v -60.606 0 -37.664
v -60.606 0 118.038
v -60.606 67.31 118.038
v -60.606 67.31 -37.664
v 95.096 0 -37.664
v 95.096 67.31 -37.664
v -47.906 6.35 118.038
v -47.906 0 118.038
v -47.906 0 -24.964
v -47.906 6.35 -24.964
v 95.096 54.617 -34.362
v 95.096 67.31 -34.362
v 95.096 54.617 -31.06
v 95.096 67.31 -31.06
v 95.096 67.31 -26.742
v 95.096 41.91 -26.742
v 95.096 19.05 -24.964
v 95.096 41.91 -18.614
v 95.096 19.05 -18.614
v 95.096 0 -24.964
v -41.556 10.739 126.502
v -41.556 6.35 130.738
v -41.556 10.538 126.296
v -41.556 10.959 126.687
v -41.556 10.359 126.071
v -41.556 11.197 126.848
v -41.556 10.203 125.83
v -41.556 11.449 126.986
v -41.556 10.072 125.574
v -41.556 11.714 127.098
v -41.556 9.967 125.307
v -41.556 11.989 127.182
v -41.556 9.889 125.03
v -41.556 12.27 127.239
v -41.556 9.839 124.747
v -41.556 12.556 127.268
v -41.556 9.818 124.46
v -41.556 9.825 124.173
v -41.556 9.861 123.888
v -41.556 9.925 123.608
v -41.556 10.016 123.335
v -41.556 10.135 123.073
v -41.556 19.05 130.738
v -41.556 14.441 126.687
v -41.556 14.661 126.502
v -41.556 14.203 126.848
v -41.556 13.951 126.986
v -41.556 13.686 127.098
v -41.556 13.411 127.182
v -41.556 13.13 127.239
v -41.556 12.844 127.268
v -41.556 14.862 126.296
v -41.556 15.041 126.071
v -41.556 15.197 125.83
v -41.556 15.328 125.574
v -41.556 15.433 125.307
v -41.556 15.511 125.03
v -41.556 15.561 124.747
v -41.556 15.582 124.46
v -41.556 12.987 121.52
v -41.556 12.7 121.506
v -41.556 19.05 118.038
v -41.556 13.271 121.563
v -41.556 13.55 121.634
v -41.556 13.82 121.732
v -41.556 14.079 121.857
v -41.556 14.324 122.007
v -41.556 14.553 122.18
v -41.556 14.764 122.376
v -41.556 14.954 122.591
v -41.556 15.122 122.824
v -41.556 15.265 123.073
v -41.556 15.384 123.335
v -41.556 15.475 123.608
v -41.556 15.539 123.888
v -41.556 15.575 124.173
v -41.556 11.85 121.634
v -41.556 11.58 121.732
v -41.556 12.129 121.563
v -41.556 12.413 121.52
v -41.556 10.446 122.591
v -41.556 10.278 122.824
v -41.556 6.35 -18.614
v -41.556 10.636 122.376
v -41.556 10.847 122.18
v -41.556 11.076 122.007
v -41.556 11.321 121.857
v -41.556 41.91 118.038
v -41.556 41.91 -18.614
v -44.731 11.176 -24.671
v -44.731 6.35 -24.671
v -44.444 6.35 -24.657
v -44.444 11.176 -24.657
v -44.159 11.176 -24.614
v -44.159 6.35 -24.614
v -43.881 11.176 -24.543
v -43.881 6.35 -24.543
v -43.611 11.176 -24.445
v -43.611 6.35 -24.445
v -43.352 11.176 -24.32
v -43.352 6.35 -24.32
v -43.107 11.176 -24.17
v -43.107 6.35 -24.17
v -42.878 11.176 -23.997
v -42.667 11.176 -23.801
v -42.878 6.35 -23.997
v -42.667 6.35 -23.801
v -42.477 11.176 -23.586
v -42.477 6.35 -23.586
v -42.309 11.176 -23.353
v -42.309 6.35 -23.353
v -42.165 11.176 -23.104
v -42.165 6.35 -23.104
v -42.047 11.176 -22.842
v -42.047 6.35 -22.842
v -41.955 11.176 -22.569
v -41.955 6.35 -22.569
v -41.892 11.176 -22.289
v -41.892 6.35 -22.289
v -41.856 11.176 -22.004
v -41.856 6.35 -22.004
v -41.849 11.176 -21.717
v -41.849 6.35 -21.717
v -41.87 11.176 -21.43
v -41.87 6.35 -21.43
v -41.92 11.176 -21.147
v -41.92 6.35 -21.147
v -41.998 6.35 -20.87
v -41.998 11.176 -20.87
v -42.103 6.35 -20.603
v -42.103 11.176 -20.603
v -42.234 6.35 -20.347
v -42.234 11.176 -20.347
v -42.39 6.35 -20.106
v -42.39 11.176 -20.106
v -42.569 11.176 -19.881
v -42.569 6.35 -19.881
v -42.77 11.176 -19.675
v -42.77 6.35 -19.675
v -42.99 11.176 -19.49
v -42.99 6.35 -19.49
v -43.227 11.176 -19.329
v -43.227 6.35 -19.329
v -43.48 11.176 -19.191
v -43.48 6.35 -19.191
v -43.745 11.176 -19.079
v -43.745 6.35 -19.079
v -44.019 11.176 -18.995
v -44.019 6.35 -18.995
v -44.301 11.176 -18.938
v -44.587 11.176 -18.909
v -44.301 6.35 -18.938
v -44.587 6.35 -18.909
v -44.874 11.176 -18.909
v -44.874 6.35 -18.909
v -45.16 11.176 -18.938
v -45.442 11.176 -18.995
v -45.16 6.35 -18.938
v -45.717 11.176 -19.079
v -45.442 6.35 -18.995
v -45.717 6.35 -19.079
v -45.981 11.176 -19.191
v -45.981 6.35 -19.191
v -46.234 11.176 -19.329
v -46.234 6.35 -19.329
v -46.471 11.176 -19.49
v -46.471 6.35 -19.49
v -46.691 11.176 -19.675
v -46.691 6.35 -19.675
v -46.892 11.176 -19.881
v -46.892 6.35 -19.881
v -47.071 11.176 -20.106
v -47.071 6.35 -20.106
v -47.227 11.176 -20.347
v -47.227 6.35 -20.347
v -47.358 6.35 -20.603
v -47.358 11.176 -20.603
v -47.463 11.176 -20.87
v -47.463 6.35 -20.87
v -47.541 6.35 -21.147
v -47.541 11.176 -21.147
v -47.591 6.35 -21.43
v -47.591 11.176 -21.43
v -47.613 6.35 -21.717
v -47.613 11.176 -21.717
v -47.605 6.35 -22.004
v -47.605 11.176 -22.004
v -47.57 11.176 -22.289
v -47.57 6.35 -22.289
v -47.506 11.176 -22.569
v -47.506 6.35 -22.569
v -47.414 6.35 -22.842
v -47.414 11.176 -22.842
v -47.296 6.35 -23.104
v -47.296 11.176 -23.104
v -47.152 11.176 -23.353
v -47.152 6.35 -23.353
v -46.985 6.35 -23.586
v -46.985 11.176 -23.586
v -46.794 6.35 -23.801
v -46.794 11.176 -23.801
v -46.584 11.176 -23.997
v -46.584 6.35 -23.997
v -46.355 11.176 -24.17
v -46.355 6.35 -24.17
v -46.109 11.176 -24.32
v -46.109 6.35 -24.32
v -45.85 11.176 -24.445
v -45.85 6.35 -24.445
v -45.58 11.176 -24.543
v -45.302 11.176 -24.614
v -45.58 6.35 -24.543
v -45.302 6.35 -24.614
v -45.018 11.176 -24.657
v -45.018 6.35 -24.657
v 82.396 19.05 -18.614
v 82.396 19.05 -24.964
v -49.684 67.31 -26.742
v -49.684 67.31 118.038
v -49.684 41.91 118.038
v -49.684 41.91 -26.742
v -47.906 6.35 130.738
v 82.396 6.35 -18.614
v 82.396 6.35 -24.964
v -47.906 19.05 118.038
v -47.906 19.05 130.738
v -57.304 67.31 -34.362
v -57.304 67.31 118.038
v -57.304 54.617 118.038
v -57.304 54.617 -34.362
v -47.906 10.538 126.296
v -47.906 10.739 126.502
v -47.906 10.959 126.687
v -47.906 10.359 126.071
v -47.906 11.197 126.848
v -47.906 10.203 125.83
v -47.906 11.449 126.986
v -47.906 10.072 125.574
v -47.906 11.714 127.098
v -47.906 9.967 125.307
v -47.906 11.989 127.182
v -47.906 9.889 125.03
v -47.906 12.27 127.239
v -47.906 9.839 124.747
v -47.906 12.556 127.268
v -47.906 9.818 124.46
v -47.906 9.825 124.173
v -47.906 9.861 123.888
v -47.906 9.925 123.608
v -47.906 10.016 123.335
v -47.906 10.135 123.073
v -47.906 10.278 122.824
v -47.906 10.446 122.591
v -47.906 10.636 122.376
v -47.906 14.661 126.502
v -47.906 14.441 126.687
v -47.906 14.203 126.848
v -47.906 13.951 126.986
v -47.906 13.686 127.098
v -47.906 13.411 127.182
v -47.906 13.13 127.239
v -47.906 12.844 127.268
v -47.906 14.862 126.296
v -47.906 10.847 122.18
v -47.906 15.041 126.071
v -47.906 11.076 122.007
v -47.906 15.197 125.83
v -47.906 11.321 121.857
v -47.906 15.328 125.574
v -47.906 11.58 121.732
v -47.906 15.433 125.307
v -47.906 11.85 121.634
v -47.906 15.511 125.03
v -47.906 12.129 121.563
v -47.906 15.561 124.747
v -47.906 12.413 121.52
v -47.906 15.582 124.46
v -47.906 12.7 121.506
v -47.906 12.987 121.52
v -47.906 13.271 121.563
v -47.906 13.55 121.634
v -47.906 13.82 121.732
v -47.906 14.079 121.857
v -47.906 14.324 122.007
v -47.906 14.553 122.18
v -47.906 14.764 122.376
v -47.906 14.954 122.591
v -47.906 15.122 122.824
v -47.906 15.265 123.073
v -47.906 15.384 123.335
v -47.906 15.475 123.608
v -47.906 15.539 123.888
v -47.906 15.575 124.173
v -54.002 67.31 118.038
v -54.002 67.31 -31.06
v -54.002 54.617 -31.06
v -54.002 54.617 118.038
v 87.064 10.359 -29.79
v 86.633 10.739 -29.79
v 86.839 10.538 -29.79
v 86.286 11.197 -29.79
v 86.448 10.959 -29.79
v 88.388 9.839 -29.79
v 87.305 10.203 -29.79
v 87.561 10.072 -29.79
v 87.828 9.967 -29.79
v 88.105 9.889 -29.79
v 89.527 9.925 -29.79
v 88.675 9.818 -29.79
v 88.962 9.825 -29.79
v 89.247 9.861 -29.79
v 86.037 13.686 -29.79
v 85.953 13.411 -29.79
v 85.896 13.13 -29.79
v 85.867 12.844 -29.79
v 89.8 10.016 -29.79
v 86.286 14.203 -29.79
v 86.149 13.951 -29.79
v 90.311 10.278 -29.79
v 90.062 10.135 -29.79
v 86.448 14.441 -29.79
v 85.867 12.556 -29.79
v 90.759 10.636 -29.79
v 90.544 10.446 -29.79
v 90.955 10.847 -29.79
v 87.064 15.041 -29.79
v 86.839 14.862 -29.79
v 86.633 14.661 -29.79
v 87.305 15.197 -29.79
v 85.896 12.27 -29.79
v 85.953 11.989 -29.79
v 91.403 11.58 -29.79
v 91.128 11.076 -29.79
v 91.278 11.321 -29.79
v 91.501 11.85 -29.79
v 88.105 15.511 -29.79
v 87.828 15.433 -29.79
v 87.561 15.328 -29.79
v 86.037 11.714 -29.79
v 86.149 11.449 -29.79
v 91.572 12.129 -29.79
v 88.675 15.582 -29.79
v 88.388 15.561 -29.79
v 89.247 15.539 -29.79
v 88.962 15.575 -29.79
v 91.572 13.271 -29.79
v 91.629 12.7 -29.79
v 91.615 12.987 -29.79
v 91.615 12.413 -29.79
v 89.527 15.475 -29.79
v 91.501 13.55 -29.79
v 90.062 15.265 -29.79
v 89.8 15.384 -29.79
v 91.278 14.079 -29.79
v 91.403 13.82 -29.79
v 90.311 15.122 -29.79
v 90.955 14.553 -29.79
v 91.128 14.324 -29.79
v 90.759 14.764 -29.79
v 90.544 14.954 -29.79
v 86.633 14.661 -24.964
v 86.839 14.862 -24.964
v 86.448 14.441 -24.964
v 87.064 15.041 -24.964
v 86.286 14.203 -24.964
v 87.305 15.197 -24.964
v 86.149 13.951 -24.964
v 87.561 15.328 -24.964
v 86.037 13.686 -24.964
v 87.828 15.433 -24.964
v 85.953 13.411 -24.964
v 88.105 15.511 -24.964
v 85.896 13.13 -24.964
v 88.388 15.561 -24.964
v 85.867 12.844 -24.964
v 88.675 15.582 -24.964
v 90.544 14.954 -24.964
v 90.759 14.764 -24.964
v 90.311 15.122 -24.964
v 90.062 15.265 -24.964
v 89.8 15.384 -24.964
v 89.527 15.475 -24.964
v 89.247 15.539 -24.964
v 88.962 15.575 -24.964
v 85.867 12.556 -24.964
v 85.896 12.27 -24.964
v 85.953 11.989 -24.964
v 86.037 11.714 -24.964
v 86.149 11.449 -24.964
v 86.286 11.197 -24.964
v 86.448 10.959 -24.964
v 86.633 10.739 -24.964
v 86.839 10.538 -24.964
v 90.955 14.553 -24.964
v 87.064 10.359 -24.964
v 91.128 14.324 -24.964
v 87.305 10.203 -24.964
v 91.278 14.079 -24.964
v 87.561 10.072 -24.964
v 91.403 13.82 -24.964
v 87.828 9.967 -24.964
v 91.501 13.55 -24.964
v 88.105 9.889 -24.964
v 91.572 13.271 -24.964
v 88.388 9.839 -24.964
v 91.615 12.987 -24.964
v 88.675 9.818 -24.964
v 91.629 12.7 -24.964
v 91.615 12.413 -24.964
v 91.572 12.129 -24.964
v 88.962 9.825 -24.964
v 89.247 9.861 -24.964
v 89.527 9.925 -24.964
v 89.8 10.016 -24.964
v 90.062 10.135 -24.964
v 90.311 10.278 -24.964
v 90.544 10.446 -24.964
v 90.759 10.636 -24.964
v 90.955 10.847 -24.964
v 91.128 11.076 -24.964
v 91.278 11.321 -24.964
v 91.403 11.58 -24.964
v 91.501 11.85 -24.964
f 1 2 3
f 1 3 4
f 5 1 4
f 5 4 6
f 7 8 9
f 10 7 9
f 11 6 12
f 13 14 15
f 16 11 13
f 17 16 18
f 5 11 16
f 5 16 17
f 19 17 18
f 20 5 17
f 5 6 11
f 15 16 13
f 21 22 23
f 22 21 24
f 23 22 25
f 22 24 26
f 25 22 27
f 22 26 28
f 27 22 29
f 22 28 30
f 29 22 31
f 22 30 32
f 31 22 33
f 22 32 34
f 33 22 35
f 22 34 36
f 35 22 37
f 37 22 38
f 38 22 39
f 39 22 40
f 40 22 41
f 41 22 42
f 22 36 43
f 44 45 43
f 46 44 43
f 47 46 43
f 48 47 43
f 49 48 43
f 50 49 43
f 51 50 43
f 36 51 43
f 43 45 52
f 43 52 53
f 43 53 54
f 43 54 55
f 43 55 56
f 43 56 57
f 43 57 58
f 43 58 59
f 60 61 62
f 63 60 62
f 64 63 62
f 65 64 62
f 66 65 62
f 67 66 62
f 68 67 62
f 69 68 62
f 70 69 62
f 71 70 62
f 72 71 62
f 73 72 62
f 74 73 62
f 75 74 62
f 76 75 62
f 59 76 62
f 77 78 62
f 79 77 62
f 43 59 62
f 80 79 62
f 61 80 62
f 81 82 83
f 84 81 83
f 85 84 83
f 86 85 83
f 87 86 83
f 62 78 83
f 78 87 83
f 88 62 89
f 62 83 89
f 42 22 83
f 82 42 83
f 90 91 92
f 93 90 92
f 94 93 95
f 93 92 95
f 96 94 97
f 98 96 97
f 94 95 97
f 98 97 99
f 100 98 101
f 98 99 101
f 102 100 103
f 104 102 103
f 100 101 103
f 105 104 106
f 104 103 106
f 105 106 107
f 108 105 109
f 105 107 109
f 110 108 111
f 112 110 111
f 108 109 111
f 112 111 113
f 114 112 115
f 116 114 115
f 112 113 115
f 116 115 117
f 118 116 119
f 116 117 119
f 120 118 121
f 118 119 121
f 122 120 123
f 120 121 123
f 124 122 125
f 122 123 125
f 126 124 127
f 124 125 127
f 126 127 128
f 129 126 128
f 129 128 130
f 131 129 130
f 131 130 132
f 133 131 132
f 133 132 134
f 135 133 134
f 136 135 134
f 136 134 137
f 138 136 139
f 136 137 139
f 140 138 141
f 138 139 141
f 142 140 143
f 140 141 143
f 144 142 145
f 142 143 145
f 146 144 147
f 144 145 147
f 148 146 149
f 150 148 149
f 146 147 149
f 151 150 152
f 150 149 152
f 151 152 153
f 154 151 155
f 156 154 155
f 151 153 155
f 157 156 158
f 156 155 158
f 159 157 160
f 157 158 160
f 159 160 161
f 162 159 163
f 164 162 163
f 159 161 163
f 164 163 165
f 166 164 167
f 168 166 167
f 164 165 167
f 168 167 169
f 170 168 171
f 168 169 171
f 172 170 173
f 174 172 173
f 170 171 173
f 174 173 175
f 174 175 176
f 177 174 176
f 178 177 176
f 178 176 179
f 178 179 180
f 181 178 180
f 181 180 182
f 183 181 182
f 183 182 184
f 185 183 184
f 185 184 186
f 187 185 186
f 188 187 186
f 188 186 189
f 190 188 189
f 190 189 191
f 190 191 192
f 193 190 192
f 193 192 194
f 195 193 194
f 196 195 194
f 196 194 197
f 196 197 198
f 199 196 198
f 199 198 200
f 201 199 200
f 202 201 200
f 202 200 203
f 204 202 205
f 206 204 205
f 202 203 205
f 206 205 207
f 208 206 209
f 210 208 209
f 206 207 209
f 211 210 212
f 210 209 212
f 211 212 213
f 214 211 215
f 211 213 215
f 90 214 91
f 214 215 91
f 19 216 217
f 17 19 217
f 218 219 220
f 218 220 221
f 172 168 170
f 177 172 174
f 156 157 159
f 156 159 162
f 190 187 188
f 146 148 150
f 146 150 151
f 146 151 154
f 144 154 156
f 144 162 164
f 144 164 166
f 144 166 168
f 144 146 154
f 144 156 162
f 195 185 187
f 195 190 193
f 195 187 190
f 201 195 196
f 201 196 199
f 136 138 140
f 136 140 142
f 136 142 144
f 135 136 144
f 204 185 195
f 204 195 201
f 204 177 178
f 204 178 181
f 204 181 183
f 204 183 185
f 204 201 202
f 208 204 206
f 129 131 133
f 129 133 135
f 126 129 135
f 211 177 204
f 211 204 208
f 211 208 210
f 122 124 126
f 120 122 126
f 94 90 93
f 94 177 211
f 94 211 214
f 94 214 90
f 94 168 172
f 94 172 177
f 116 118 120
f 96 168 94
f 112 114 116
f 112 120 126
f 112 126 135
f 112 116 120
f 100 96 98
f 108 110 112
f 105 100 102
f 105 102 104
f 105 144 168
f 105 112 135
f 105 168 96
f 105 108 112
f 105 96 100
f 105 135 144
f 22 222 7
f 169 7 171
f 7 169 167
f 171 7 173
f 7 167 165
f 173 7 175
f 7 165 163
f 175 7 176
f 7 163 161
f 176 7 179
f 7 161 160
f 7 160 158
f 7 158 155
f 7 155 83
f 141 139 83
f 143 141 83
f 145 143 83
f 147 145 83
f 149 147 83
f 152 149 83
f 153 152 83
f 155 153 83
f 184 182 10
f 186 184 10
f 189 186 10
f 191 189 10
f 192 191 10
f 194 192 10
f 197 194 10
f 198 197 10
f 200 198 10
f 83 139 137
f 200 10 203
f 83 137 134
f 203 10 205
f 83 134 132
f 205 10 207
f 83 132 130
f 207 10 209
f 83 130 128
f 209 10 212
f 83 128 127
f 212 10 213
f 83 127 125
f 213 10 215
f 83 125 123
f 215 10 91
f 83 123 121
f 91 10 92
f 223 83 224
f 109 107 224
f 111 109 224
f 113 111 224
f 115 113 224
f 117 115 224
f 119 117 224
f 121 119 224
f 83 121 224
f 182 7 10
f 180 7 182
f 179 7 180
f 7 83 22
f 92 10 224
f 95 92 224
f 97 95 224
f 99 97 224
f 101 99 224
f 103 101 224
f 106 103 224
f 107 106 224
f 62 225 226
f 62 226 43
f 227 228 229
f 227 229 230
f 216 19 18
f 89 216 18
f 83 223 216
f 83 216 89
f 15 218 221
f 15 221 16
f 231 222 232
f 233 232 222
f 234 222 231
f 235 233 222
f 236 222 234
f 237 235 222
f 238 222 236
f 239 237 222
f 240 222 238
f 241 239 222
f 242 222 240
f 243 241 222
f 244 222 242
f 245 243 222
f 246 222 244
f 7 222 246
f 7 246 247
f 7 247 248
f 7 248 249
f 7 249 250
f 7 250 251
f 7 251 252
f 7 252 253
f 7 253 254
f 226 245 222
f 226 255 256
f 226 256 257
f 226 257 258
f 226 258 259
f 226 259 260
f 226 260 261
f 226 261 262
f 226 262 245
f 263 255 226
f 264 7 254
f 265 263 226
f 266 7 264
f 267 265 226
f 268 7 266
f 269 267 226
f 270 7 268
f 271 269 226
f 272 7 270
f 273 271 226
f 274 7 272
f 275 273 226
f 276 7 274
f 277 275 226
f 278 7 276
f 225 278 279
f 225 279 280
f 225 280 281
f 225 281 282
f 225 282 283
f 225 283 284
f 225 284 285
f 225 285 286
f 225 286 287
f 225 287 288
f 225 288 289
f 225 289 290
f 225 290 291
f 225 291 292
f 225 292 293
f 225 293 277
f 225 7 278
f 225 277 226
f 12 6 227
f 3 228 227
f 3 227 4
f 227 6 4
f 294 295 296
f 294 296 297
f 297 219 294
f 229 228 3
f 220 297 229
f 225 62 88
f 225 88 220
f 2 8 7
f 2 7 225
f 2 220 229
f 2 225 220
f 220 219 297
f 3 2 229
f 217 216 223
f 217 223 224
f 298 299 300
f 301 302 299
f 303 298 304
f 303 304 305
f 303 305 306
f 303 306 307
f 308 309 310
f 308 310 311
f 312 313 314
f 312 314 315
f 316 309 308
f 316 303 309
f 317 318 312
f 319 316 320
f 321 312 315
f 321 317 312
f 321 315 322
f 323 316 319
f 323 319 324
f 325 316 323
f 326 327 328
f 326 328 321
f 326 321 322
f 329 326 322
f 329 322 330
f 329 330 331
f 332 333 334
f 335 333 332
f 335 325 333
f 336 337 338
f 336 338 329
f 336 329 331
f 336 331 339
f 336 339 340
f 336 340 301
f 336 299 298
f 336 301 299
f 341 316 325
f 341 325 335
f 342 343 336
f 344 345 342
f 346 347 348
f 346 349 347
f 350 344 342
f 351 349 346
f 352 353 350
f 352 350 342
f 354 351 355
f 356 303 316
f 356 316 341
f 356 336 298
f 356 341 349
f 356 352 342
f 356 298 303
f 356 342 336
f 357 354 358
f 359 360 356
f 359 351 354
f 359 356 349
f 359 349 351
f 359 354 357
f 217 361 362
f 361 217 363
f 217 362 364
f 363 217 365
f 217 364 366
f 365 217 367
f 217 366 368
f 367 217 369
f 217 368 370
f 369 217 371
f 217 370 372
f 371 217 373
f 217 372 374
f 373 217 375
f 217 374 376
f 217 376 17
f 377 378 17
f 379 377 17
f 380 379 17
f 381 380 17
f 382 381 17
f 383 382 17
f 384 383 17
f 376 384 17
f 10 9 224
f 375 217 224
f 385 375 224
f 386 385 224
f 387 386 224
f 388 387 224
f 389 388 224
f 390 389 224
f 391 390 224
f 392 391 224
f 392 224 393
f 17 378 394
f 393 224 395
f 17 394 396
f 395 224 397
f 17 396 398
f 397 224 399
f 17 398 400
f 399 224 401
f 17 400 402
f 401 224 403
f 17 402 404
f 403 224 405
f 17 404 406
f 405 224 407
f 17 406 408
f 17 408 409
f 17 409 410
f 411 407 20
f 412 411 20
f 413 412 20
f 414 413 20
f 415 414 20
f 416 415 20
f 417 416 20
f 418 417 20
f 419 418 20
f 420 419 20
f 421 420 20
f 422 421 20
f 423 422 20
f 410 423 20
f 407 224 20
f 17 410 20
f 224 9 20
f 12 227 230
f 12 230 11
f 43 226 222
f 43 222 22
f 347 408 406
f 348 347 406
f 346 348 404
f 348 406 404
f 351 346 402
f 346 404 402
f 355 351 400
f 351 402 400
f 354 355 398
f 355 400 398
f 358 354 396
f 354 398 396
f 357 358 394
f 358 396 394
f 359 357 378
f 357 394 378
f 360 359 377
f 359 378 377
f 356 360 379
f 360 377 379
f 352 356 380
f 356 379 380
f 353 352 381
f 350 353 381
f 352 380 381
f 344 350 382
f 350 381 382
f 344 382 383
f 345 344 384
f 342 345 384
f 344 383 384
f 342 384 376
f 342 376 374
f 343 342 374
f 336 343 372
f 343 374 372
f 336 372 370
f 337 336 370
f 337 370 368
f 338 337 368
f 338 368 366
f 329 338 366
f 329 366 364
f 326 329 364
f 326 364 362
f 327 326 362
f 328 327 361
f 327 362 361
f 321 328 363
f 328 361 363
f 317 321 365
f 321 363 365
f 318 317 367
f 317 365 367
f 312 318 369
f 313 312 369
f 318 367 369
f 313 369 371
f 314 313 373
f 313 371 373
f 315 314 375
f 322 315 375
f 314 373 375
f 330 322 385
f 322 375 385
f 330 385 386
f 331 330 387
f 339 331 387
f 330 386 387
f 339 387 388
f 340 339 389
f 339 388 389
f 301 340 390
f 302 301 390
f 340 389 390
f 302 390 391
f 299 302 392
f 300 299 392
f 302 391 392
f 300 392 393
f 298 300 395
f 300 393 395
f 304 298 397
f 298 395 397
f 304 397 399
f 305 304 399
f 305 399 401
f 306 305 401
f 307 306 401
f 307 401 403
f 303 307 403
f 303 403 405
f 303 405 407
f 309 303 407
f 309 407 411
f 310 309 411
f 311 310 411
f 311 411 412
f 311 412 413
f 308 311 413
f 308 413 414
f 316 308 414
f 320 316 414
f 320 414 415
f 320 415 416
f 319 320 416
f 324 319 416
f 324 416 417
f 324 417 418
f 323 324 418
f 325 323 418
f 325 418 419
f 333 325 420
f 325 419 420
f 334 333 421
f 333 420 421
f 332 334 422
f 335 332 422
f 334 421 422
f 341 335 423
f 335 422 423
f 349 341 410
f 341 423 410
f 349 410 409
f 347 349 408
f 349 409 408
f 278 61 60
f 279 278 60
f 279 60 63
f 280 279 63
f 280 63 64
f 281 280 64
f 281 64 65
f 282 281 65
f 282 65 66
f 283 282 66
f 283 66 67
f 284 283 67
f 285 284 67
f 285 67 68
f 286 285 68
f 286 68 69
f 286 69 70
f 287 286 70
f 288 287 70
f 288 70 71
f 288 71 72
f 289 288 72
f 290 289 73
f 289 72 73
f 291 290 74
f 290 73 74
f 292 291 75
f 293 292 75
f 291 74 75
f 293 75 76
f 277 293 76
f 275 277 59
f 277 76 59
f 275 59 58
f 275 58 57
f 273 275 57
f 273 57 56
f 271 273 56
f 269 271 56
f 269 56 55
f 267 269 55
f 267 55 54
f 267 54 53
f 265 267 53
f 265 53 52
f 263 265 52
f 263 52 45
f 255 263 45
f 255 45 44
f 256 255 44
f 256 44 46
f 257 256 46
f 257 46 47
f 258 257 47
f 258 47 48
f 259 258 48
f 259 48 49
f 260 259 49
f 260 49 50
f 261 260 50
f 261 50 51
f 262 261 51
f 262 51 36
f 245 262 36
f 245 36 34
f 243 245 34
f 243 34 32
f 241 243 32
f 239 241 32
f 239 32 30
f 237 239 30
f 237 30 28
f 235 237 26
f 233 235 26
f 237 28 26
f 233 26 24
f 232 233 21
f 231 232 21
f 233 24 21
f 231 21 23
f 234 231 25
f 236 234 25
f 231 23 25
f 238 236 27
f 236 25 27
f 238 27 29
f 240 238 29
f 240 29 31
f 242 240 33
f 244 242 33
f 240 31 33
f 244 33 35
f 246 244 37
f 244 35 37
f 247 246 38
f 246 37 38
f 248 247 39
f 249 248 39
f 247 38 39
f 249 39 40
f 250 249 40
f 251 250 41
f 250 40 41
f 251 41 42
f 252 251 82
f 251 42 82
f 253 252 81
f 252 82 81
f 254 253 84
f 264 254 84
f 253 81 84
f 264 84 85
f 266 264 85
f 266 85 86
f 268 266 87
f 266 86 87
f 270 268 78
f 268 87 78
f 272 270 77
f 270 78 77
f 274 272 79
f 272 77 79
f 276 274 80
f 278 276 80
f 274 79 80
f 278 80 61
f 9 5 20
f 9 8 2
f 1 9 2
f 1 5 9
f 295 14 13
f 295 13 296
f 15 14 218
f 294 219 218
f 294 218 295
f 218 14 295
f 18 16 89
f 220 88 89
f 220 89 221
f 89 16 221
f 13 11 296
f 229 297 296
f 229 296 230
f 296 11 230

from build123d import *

# Parameters (mm, degrees)
BOSS_EXTRUDE5_DEPTH = 67.31
CUT_EXTRUDE2_DEPTH  = 12.693340834
CUT_EXTRUDE3_DEPTH  = 25.4
CUT_EXTRUDE5_DEPTH  = 6.35
SKETCH16_W          = 6.35
SKETCH16_H          = 12.7
BOSS_EXTRUDE6_DEPTH = 12.7
SKETCH17_W          = 6.35
SKETCH17_H          = 12.7
CUT_EXTRUDE6_DEPTH  = 12.7
SKETCH18_R          = 2.8829
CUT_EXTRUDE7_DEPTH  = 12.7
SKETCH19_R          = 2.8829
CUT_EXTRUDE8_DEPTH  = 4.826
SKETCH21_R          = 2.8829
CUT_EXTRUDE9_DEPTH  = 4.826


with BuildPart() as part:
    # Sketch1 → Boss-Extrude5 (new body)
    with BuildSketch(Plane(origin=(0, 0, 0), x_dir=(1, 0, 0), z_dir=(0, 1, 0))):
        Polygon((-60.605605599, 37.663504972), (95.096394401, 37.663504972), (95.096394401, 18.613504972), (-41.555605599, 18.613504972), (-41.555605599, -118.038495028), (-60.605605599, -118.038495028), align=None)
    extrude(amount=BOSS_EXTRUDE5_DEPTH)

    # Sketch8 → Cut-Extrude2 (cut)
    with BuildSketch(Plane(origin=(0, 67.31, 0), x_dir=(1, 0, 0), z_dir=(0, 1, 0))):
        Polygon((-57.303605599, -118.038495028), (-57.303605599, 34.361504972), (95.096394401, 34.361504972), (95.096394401, 31.059504972), (-54.001605599, 31.059504972), (-54.001605599, -118.038495028), align=None)
    extrude(amount=-CUT_EXTRUDE2_DEPTH, mode=Mode.SUBTRACT)

    # Sketch9 → Cut-Extrude3 (cut)
    with BuildSketch(Plane(origin=(0, 67.31, 0), x_dir=(1, 0, 0), z_dir=(0, 1, 0))):
        Polygon((-49.683605599, -118.038495028), (-49.683605599, 26.741504972), (95.096394401, 26.741504972), (95.096394401, 18.613504972), (-41.555605599, 18.613504972), (-41.555605599, -118.038495028), align=None)
    extrude(amount=-CUT_EXTRUDE3_DEPTH, mode=Mode.SUBTRACT)

    # Sketch15 → Cut-Extrude5 (cut)
    with BuildSketch(Plane.XZ):
        Polygon((-41.555605599, 118.038495028), (-47.905605599, 118.038495028), (-47.905605599, -24.963504972), (95.096394401, -24.963504972), (95.096394401, -18.613504972), (-41.555605599, -18.613504972), align=None)
    extrude(amount=-CUT_EXTRUDE5_DEPTH, mode=Mode.SUBTRACT)

    # Sketch16 → Boss-Extrude6 (add)
    with BuildSketch(Plane.XY.offset(118.038495028)):
        with Locations((-44.730605599, 12.7)):
            Rectangle(SKETCH16_W, SKETCH16_H)
    extrude(amount=BOSS_EXTRUDE6_DEPTH)

    # Sketch17 → Cut-Extrude6 (cut)
    with BuildSketch(Plane(origin=(95.096394401, 0, 0), x_dir=(0, 0, -1), z_dir=(1, 0, 0))):
        with Locations((21.788504972, 12.7)):
            Rectangle(SKETCH17_W, SKETCH17_H)
    extrude(amount=-CUT_EXTRUDE6_DEPTH, mode=Mode.SUBTRACT)

    # Sketch18 → Cut-Extrude7 (cut)
    with BuildSketch(Plane(origin=(-41.555605599, 0, 0), x_dir=(0, 0, -1), z_dir=(1, 0, 0))):
        with Locations((-124.388495028, 12.7)):
            Circle(SKETCH18_R)
    extrude(amount=-CUT_EXTRUDE7_DEPTH, mode=Mode.SUBTRACT)

    # Sketch19 → Cut-Extrude8 (cut)
    with BuildSketch(Plane.XY.offset(-24.963504972)):
        with Locations((88.746394401, 12.7)):
            Circle(SKETCH19_R)
    extrude(amount=-CUT_EXTRUDE8_DEPTH, mode=Mode.SUBTRACT)

    # Sketch21 → Cut-Extrude9 (cut)
    with BuildSketch(Plane.XZ.offset(-6.35)):
        with Locations(Location((-44.730605599, -21.788504972, 0), (0, 0, 270))):
            Circle(SKETCH21_R)
    extrude(amount=-CUT_EXTRUDE9_DEPTH, mode=Mode.SUBTRACT)


solid = part.part
